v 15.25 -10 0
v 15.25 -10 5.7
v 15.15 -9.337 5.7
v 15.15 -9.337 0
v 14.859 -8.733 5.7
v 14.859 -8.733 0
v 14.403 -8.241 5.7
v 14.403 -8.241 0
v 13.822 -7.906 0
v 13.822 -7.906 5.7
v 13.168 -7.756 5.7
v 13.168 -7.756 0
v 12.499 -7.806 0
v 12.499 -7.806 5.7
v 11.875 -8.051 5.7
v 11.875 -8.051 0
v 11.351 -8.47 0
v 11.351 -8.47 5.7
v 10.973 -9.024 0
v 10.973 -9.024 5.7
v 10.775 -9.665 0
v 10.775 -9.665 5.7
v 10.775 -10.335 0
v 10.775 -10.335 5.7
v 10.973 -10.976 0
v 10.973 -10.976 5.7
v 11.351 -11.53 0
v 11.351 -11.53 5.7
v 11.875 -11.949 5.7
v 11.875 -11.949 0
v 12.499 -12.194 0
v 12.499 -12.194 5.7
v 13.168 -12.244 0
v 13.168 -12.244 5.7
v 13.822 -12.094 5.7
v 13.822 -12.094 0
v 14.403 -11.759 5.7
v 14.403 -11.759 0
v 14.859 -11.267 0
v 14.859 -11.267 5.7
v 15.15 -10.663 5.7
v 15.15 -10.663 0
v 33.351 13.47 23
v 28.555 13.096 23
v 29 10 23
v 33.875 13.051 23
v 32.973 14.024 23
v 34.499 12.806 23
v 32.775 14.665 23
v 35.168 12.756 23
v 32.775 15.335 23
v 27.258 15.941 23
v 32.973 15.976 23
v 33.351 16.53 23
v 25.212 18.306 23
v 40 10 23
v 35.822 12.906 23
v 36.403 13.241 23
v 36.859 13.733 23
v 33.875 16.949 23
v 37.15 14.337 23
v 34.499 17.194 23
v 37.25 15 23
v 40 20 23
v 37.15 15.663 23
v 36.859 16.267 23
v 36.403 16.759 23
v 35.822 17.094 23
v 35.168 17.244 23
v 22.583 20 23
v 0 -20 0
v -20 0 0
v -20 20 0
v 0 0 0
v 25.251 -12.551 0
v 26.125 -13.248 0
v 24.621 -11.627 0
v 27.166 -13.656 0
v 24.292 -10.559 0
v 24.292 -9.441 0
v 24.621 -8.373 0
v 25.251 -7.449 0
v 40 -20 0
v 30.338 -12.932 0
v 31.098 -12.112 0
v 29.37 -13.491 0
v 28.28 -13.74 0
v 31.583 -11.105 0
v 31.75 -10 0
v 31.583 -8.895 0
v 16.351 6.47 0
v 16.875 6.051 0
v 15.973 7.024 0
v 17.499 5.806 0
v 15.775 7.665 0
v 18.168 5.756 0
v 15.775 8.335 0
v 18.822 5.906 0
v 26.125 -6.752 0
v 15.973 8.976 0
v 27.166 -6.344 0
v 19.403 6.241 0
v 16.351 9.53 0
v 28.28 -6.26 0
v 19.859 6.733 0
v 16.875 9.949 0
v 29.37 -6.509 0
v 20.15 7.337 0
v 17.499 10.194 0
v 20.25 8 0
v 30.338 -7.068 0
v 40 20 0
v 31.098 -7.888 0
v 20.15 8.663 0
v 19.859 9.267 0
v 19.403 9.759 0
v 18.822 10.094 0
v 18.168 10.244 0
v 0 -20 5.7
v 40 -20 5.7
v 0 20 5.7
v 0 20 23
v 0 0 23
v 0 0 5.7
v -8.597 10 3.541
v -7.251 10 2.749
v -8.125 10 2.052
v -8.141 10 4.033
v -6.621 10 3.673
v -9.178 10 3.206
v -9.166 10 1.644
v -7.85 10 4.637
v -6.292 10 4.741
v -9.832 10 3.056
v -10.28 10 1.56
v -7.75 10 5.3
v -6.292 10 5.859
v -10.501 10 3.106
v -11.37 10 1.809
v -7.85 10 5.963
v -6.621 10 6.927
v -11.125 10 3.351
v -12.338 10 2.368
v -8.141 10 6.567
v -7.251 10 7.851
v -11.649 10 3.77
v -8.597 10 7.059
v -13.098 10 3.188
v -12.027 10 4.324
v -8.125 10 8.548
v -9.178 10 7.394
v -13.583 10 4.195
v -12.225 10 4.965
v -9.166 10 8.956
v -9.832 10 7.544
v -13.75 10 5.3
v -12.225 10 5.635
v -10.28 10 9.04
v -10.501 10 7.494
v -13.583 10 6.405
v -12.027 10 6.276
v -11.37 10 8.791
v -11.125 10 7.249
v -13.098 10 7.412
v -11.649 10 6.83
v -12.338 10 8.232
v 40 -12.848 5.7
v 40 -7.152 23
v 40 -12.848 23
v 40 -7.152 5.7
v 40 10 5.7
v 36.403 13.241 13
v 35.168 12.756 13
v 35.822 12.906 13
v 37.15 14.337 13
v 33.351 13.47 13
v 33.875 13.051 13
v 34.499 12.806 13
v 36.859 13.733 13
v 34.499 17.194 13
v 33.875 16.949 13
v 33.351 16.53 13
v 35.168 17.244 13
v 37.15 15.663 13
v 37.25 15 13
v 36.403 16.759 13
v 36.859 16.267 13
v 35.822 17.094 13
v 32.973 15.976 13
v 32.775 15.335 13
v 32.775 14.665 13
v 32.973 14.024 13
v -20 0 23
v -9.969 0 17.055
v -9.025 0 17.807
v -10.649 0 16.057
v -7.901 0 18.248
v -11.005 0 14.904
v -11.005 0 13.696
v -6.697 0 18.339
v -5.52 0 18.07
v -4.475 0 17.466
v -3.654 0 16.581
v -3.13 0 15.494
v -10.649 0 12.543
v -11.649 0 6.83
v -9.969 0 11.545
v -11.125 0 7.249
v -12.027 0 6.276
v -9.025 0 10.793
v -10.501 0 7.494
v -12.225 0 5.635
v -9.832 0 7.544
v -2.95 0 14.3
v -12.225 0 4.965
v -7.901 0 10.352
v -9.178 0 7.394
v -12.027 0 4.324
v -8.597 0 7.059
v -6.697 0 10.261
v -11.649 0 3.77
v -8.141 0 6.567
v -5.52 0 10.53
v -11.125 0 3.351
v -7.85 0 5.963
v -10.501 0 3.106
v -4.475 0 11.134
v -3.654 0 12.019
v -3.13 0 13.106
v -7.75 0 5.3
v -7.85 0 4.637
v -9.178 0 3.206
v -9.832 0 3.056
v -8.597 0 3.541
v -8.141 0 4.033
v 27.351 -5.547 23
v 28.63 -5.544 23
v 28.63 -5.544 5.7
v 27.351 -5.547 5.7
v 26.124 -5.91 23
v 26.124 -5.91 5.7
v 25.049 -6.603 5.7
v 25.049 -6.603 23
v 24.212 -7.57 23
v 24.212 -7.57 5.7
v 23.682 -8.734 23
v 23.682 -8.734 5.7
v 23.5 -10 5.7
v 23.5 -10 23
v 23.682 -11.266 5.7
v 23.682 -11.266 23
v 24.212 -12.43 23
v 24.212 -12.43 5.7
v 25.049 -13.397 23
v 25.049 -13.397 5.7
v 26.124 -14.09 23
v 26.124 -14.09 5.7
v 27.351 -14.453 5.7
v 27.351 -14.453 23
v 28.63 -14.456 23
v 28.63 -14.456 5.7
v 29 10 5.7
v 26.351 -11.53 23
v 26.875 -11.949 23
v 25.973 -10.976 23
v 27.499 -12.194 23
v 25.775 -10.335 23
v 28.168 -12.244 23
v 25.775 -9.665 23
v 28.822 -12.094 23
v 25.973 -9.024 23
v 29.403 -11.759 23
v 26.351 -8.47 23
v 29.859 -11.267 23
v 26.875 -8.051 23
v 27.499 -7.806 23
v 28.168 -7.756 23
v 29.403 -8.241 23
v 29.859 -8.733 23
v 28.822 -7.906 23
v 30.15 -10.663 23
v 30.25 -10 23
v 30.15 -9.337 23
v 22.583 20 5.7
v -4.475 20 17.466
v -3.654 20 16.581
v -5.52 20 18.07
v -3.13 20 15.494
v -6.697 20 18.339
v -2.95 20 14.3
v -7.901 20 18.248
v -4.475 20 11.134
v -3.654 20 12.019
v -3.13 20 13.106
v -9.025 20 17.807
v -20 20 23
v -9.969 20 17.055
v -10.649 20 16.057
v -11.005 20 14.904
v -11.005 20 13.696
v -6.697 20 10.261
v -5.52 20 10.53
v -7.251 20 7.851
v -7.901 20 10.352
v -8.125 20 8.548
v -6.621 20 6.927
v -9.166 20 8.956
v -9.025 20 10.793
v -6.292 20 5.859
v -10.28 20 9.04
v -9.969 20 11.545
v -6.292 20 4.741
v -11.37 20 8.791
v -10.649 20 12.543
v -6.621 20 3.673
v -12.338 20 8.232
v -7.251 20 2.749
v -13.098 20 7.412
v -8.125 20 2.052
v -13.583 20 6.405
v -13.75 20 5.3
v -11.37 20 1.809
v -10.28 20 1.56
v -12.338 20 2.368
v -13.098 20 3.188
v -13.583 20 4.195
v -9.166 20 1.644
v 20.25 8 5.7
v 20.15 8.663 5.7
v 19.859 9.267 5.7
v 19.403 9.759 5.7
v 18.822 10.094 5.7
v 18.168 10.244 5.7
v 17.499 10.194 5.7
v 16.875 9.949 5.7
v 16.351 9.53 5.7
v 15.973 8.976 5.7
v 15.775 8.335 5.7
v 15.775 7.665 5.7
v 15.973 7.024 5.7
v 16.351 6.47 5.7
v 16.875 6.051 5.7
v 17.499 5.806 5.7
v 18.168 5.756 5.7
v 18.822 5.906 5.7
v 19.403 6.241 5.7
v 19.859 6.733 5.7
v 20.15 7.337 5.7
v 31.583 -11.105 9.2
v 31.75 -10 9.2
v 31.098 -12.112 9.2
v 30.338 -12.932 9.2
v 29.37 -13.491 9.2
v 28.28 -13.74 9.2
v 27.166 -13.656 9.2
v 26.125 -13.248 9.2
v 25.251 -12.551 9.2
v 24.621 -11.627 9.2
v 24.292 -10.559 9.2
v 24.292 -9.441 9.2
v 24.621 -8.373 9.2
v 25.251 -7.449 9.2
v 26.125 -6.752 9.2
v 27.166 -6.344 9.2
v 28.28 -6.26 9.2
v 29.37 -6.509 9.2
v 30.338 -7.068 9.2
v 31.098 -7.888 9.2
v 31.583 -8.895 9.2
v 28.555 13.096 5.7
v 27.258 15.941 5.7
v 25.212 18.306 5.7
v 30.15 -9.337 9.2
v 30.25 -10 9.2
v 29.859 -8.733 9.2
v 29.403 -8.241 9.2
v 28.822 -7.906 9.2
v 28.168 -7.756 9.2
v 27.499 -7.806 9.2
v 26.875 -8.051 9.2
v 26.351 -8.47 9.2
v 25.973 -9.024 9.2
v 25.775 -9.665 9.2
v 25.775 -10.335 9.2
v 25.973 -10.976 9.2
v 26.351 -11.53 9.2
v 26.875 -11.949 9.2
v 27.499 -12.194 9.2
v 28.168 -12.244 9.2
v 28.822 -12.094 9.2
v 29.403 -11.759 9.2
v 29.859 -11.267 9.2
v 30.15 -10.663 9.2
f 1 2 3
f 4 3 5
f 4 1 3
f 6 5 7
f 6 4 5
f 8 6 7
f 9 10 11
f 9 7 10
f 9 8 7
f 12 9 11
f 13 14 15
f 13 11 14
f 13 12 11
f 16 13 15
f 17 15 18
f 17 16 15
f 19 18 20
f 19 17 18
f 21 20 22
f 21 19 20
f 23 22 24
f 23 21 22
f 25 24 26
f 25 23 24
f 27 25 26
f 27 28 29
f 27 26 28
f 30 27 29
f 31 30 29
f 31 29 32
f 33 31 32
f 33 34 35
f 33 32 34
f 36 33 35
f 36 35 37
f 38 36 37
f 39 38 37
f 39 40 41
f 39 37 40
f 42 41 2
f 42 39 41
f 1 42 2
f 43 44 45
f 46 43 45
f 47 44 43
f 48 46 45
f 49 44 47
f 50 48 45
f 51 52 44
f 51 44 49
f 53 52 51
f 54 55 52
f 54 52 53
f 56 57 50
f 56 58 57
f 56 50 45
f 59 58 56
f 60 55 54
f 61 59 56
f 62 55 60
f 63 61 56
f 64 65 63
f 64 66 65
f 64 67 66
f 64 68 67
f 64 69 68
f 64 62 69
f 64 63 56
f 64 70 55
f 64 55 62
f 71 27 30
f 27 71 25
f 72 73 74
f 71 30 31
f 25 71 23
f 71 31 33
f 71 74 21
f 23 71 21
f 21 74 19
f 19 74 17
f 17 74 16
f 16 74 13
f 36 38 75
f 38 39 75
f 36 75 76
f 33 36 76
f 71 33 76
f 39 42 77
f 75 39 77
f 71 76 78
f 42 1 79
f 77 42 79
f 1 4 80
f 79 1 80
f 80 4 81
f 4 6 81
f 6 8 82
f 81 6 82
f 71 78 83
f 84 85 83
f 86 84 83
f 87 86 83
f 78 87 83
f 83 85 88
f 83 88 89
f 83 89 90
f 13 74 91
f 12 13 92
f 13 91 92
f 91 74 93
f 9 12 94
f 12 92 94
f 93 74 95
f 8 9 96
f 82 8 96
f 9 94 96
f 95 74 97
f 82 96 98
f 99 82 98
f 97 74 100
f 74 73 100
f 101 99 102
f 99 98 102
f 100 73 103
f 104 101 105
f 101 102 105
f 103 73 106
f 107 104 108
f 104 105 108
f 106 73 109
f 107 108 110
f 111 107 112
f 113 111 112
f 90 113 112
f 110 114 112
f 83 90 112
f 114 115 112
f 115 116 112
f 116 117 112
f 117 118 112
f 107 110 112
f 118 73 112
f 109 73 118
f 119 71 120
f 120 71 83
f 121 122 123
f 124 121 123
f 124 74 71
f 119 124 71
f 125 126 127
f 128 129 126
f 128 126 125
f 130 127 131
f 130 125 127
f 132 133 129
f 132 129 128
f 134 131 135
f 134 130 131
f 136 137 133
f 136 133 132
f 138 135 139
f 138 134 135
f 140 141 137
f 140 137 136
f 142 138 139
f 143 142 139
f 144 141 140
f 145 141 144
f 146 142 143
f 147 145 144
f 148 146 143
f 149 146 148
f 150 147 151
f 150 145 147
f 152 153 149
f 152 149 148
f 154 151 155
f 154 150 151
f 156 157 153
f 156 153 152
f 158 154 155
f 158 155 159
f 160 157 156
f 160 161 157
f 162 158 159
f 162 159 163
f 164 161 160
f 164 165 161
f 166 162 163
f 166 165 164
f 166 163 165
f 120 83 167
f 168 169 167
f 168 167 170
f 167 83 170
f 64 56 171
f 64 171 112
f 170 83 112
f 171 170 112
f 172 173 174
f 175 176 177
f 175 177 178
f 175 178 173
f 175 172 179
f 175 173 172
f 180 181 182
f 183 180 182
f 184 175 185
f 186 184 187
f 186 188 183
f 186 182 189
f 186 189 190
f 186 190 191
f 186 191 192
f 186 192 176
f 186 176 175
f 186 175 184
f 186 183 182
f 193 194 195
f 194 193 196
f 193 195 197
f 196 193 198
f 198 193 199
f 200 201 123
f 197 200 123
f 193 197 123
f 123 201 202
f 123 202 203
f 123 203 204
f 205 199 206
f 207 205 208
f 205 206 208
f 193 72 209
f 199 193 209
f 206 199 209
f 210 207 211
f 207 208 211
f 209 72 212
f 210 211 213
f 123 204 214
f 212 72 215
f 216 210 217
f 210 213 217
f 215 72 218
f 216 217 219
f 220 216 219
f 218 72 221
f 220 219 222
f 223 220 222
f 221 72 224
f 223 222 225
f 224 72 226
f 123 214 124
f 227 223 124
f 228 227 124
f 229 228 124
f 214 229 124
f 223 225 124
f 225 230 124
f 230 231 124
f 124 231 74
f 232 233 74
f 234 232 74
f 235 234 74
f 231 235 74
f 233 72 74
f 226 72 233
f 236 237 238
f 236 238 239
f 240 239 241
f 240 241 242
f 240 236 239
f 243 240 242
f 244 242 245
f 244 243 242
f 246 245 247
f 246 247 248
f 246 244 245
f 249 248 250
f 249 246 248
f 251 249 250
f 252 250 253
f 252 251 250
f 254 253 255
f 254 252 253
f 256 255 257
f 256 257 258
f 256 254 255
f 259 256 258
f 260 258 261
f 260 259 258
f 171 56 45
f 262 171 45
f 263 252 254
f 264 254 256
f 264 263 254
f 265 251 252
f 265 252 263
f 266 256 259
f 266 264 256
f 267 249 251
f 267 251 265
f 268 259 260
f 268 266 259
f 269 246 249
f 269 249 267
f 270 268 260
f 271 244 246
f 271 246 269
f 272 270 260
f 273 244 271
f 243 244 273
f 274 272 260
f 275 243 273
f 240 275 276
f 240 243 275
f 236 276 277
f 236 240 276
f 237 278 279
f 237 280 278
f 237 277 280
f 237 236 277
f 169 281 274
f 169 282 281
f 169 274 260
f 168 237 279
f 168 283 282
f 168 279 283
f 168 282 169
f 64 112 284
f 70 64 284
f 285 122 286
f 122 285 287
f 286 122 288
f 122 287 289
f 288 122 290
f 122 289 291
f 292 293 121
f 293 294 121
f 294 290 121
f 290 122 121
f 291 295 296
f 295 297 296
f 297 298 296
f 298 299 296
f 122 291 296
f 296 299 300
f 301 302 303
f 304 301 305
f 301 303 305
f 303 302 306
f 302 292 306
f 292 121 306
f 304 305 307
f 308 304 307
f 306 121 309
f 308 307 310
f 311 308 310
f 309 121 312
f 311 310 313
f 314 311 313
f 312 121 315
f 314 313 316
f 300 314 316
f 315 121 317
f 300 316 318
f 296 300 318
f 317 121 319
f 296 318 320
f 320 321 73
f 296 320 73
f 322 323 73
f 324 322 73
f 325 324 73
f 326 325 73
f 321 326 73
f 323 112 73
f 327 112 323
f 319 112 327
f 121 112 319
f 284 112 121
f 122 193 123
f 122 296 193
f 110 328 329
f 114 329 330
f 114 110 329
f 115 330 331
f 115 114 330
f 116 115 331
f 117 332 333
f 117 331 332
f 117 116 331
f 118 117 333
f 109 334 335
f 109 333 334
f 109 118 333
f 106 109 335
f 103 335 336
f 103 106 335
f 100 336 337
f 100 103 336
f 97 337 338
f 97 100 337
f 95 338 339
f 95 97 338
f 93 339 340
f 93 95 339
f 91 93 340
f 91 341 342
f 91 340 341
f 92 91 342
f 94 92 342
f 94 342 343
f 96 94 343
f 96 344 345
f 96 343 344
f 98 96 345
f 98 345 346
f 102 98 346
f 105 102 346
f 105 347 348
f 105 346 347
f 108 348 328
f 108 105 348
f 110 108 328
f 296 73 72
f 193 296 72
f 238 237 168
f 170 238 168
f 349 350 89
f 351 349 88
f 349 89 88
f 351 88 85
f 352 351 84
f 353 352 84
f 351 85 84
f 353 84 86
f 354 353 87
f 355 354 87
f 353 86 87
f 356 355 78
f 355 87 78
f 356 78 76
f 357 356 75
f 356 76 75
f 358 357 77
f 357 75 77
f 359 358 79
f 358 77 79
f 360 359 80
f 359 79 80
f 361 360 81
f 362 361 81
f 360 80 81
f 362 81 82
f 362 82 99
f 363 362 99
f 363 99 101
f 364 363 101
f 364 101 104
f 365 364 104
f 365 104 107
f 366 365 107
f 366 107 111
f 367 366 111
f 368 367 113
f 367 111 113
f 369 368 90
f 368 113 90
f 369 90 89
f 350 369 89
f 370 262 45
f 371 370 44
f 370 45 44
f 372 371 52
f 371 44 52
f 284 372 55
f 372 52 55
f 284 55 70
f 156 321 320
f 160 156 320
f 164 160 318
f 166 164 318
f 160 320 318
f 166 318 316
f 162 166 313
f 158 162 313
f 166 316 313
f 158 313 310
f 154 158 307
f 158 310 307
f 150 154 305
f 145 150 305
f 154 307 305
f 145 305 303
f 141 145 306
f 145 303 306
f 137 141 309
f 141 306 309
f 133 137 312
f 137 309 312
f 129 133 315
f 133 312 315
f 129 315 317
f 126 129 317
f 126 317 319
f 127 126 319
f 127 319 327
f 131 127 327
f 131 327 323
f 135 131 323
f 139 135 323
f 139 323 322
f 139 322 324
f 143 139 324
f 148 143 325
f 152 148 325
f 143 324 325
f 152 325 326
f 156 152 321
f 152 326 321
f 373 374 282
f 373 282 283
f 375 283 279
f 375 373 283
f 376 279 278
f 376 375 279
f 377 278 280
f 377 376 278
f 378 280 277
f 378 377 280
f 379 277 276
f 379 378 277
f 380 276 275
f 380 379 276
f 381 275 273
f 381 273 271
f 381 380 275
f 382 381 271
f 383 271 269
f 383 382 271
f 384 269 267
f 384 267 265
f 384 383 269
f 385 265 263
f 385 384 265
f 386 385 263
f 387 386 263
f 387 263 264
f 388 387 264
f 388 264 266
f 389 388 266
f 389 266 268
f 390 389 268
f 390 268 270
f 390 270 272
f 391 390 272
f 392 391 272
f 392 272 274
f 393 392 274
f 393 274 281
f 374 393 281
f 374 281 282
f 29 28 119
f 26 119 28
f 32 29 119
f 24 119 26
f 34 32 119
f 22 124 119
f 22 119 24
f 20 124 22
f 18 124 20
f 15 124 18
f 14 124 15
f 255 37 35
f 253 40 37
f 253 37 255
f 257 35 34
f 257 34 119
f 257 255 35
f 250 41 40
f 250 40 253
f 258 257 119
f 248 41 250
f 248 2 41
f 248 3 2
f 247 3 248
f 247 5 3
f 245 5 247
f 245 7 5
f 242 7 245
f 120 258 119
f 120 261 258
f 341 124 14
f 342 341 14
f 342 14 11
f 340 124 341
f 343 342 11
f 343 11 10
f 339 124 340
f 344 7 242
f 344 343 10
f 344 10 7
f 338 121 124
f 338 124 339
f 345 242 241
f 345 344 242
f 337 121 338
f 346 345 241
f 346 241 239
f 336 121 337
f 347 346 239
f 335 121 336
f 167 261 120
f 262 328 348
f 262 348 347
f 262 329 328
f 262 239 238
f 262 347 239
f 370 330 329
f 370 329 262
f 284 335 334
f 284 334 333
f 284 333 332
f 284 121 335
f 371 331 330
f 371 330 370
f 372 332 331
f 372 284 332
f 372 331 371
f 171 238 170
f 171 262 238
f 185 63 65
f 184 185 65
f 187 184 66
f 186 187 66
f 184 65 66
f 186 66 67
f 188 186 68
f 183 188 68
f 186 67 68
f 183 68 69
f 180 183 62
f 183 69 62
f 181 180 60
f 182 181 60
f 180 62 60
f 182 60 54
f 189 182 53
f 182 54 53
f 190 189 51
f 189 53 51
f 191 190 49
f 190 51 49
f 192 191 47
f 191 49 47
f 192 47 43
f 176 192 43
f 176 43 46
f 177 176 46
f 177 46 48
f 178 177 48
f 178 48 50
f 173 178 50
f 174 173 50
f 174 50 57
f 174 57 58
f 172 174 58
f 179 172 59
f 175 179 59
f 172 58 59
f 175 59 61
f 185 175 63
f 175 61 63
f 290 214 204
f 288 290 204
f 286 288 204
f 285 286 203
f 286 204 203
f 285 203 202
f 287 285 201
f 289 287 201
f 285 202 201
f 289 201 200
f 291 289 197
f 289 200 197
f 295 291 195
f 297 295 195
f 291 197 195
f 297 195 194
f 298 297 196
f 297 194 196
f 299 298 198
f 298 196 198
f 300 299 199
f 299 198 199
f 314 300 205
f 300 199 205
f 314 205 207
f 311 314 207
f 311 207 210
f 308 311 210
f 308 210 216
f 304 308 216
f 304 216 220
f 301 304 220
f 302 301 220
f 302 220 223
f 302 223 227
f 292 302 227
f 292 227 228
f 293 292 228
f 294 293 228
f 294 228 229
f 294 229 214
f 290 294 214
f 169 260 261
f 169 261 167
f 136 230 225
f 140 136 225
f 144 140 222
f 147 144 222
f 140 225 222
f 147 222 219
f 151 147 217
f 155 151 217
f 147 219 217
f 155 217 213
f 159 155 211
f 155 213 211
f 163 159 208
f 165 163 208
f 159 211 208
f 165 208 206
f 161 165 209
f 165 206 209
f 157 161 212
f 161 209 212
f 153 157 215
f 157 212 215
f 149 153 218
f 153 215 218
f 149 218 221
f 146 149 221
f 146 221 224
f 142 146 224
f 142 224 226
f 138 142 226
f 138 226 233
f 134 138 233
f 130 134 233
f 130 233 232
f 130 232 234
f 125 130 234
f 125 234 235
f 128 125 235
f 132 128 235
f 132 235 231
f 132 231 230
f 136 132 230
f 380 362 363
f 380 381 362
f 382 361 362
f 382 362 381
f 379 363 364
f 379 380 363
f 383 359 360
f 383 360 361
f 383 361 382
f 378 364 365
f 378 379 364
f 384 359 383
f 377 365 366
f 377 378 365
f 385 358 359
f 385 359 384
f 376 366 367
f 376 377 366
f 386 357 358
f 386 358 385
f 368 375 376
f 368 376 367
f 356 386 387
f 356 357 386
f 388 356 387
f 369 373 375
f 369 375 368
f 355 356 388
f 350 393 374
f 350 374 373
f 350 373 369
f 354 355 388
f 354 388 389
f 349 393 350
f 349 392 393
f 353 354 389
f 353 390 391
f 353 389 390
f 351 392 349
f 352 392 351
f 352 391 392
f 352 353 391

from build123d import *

# Parameters (mm, degrees)
SKETCH_R        = 2.25
PAD_DEPTH       = 23
POCKET_DEPTH    = 17.3
SKETCH002_R     = 4.05
SKETCH002_R_2   = 2.25
POCKET001_DEPTH = 20.001
SKETCH003_R     = 2.25
POCKET002_DEPTH = 10
SKETCH004_R     = 3.75
POCKET003_DEPTH = 10
SKETCH005_R     = 3.75
POCKET004_DEPTH = 9.2


with BuildPart() as part:
    # Sketch → Pad (new body)
    with BuildSketch(Plane.XY):
        Polygon((0, -20), (40, -20), (40, 20), (-20, 20), (-20, 0), (0, 0), align=None)
        with Locations((18, 8)):
            Circle(SKETCH_R, mode=Mode.SUBTRACT)
        with Locations((13, -10)):
            Circle(SKETCH_R, mode=Mode.SUBTRACT)
        with Locations((28, -10)):
            Circle(SKETCH_R, mode=Mode.SUBTRACT)
    extrude(amount=PAD_DEPTH)

    # Sketch001 → Pocket (cut)
    with BuildSketch(Plane.XY.offset(23)):
        with BuildLine():
            Line((46, 10), (29, 10))
            ThreePointArc((29, 10), (25.778159, 17.77819), (17.999956, 21))
            Line((17.999956, 21), (0, 21))
            Line((0, 21), (0, -23))
            Line((0, -23), (46, -23))
            Line((46, -23), (46, -12))
            Line((28.629923, -14.455693), (46, -12))
            ThreePointArc((28.629923, -5.544307), (23.5, -10), (28.629923, -14.455693))
            Line((28.629923, -5.544307), (46, -8))
            Line((46, -8), (46, 10))
        make_face()
    extrude(amount=-POCKET_DEPTH, mode=Mode.SUBTRACT)

    # Sketch002 → Pocket001 (cut, through all)
    with BuildSketch(Plane.XZ):
        with Locations((-7, 14.3)):
            Circle(SKETCH002_R)
        with Locations((-10, 5.3)):
            Circle(SKETCH002_R_2)
    extrude(amount=-POCKET001_DEPTH, mode=Mode.SUBTRACT)

    # Sketch003 → Pocket002 (cut)
    with BuildSketch(Plane.XY.offset(23)):
        with Locations((35, 15)):
            Circle(SKETCH003_R)
    extrude(amount=-POCKET002_DEPTH, mode=Mode.SUBTRACT)

    # Sketch004 → Pocket003 (cut)
    with BuildSketch(Plane(origin=(0, 20, 0), x_dir=(-1, 0, 0), z_dir=(0, 1, 0))):
        with Locations((10, 5.3)):
            Circle(SKETCH004_R)
    extrude(amount=-POCKET003_DEPTH, mode=Mode.SUBTRACT)

    # Sketch005 → Pocket004 (cut)
    with BuildSketch(Plane(origin=(0, 0, 0), x_dir=(1, 0, 0), z_dir=(0, 0, -1))):
        with Locations((28, 10)):
            Circle(SKETCH005_R)
    extrude(amount=-POCKET004_DEPTH, mode=Mode.SUBTRACT)


solid = part.part
